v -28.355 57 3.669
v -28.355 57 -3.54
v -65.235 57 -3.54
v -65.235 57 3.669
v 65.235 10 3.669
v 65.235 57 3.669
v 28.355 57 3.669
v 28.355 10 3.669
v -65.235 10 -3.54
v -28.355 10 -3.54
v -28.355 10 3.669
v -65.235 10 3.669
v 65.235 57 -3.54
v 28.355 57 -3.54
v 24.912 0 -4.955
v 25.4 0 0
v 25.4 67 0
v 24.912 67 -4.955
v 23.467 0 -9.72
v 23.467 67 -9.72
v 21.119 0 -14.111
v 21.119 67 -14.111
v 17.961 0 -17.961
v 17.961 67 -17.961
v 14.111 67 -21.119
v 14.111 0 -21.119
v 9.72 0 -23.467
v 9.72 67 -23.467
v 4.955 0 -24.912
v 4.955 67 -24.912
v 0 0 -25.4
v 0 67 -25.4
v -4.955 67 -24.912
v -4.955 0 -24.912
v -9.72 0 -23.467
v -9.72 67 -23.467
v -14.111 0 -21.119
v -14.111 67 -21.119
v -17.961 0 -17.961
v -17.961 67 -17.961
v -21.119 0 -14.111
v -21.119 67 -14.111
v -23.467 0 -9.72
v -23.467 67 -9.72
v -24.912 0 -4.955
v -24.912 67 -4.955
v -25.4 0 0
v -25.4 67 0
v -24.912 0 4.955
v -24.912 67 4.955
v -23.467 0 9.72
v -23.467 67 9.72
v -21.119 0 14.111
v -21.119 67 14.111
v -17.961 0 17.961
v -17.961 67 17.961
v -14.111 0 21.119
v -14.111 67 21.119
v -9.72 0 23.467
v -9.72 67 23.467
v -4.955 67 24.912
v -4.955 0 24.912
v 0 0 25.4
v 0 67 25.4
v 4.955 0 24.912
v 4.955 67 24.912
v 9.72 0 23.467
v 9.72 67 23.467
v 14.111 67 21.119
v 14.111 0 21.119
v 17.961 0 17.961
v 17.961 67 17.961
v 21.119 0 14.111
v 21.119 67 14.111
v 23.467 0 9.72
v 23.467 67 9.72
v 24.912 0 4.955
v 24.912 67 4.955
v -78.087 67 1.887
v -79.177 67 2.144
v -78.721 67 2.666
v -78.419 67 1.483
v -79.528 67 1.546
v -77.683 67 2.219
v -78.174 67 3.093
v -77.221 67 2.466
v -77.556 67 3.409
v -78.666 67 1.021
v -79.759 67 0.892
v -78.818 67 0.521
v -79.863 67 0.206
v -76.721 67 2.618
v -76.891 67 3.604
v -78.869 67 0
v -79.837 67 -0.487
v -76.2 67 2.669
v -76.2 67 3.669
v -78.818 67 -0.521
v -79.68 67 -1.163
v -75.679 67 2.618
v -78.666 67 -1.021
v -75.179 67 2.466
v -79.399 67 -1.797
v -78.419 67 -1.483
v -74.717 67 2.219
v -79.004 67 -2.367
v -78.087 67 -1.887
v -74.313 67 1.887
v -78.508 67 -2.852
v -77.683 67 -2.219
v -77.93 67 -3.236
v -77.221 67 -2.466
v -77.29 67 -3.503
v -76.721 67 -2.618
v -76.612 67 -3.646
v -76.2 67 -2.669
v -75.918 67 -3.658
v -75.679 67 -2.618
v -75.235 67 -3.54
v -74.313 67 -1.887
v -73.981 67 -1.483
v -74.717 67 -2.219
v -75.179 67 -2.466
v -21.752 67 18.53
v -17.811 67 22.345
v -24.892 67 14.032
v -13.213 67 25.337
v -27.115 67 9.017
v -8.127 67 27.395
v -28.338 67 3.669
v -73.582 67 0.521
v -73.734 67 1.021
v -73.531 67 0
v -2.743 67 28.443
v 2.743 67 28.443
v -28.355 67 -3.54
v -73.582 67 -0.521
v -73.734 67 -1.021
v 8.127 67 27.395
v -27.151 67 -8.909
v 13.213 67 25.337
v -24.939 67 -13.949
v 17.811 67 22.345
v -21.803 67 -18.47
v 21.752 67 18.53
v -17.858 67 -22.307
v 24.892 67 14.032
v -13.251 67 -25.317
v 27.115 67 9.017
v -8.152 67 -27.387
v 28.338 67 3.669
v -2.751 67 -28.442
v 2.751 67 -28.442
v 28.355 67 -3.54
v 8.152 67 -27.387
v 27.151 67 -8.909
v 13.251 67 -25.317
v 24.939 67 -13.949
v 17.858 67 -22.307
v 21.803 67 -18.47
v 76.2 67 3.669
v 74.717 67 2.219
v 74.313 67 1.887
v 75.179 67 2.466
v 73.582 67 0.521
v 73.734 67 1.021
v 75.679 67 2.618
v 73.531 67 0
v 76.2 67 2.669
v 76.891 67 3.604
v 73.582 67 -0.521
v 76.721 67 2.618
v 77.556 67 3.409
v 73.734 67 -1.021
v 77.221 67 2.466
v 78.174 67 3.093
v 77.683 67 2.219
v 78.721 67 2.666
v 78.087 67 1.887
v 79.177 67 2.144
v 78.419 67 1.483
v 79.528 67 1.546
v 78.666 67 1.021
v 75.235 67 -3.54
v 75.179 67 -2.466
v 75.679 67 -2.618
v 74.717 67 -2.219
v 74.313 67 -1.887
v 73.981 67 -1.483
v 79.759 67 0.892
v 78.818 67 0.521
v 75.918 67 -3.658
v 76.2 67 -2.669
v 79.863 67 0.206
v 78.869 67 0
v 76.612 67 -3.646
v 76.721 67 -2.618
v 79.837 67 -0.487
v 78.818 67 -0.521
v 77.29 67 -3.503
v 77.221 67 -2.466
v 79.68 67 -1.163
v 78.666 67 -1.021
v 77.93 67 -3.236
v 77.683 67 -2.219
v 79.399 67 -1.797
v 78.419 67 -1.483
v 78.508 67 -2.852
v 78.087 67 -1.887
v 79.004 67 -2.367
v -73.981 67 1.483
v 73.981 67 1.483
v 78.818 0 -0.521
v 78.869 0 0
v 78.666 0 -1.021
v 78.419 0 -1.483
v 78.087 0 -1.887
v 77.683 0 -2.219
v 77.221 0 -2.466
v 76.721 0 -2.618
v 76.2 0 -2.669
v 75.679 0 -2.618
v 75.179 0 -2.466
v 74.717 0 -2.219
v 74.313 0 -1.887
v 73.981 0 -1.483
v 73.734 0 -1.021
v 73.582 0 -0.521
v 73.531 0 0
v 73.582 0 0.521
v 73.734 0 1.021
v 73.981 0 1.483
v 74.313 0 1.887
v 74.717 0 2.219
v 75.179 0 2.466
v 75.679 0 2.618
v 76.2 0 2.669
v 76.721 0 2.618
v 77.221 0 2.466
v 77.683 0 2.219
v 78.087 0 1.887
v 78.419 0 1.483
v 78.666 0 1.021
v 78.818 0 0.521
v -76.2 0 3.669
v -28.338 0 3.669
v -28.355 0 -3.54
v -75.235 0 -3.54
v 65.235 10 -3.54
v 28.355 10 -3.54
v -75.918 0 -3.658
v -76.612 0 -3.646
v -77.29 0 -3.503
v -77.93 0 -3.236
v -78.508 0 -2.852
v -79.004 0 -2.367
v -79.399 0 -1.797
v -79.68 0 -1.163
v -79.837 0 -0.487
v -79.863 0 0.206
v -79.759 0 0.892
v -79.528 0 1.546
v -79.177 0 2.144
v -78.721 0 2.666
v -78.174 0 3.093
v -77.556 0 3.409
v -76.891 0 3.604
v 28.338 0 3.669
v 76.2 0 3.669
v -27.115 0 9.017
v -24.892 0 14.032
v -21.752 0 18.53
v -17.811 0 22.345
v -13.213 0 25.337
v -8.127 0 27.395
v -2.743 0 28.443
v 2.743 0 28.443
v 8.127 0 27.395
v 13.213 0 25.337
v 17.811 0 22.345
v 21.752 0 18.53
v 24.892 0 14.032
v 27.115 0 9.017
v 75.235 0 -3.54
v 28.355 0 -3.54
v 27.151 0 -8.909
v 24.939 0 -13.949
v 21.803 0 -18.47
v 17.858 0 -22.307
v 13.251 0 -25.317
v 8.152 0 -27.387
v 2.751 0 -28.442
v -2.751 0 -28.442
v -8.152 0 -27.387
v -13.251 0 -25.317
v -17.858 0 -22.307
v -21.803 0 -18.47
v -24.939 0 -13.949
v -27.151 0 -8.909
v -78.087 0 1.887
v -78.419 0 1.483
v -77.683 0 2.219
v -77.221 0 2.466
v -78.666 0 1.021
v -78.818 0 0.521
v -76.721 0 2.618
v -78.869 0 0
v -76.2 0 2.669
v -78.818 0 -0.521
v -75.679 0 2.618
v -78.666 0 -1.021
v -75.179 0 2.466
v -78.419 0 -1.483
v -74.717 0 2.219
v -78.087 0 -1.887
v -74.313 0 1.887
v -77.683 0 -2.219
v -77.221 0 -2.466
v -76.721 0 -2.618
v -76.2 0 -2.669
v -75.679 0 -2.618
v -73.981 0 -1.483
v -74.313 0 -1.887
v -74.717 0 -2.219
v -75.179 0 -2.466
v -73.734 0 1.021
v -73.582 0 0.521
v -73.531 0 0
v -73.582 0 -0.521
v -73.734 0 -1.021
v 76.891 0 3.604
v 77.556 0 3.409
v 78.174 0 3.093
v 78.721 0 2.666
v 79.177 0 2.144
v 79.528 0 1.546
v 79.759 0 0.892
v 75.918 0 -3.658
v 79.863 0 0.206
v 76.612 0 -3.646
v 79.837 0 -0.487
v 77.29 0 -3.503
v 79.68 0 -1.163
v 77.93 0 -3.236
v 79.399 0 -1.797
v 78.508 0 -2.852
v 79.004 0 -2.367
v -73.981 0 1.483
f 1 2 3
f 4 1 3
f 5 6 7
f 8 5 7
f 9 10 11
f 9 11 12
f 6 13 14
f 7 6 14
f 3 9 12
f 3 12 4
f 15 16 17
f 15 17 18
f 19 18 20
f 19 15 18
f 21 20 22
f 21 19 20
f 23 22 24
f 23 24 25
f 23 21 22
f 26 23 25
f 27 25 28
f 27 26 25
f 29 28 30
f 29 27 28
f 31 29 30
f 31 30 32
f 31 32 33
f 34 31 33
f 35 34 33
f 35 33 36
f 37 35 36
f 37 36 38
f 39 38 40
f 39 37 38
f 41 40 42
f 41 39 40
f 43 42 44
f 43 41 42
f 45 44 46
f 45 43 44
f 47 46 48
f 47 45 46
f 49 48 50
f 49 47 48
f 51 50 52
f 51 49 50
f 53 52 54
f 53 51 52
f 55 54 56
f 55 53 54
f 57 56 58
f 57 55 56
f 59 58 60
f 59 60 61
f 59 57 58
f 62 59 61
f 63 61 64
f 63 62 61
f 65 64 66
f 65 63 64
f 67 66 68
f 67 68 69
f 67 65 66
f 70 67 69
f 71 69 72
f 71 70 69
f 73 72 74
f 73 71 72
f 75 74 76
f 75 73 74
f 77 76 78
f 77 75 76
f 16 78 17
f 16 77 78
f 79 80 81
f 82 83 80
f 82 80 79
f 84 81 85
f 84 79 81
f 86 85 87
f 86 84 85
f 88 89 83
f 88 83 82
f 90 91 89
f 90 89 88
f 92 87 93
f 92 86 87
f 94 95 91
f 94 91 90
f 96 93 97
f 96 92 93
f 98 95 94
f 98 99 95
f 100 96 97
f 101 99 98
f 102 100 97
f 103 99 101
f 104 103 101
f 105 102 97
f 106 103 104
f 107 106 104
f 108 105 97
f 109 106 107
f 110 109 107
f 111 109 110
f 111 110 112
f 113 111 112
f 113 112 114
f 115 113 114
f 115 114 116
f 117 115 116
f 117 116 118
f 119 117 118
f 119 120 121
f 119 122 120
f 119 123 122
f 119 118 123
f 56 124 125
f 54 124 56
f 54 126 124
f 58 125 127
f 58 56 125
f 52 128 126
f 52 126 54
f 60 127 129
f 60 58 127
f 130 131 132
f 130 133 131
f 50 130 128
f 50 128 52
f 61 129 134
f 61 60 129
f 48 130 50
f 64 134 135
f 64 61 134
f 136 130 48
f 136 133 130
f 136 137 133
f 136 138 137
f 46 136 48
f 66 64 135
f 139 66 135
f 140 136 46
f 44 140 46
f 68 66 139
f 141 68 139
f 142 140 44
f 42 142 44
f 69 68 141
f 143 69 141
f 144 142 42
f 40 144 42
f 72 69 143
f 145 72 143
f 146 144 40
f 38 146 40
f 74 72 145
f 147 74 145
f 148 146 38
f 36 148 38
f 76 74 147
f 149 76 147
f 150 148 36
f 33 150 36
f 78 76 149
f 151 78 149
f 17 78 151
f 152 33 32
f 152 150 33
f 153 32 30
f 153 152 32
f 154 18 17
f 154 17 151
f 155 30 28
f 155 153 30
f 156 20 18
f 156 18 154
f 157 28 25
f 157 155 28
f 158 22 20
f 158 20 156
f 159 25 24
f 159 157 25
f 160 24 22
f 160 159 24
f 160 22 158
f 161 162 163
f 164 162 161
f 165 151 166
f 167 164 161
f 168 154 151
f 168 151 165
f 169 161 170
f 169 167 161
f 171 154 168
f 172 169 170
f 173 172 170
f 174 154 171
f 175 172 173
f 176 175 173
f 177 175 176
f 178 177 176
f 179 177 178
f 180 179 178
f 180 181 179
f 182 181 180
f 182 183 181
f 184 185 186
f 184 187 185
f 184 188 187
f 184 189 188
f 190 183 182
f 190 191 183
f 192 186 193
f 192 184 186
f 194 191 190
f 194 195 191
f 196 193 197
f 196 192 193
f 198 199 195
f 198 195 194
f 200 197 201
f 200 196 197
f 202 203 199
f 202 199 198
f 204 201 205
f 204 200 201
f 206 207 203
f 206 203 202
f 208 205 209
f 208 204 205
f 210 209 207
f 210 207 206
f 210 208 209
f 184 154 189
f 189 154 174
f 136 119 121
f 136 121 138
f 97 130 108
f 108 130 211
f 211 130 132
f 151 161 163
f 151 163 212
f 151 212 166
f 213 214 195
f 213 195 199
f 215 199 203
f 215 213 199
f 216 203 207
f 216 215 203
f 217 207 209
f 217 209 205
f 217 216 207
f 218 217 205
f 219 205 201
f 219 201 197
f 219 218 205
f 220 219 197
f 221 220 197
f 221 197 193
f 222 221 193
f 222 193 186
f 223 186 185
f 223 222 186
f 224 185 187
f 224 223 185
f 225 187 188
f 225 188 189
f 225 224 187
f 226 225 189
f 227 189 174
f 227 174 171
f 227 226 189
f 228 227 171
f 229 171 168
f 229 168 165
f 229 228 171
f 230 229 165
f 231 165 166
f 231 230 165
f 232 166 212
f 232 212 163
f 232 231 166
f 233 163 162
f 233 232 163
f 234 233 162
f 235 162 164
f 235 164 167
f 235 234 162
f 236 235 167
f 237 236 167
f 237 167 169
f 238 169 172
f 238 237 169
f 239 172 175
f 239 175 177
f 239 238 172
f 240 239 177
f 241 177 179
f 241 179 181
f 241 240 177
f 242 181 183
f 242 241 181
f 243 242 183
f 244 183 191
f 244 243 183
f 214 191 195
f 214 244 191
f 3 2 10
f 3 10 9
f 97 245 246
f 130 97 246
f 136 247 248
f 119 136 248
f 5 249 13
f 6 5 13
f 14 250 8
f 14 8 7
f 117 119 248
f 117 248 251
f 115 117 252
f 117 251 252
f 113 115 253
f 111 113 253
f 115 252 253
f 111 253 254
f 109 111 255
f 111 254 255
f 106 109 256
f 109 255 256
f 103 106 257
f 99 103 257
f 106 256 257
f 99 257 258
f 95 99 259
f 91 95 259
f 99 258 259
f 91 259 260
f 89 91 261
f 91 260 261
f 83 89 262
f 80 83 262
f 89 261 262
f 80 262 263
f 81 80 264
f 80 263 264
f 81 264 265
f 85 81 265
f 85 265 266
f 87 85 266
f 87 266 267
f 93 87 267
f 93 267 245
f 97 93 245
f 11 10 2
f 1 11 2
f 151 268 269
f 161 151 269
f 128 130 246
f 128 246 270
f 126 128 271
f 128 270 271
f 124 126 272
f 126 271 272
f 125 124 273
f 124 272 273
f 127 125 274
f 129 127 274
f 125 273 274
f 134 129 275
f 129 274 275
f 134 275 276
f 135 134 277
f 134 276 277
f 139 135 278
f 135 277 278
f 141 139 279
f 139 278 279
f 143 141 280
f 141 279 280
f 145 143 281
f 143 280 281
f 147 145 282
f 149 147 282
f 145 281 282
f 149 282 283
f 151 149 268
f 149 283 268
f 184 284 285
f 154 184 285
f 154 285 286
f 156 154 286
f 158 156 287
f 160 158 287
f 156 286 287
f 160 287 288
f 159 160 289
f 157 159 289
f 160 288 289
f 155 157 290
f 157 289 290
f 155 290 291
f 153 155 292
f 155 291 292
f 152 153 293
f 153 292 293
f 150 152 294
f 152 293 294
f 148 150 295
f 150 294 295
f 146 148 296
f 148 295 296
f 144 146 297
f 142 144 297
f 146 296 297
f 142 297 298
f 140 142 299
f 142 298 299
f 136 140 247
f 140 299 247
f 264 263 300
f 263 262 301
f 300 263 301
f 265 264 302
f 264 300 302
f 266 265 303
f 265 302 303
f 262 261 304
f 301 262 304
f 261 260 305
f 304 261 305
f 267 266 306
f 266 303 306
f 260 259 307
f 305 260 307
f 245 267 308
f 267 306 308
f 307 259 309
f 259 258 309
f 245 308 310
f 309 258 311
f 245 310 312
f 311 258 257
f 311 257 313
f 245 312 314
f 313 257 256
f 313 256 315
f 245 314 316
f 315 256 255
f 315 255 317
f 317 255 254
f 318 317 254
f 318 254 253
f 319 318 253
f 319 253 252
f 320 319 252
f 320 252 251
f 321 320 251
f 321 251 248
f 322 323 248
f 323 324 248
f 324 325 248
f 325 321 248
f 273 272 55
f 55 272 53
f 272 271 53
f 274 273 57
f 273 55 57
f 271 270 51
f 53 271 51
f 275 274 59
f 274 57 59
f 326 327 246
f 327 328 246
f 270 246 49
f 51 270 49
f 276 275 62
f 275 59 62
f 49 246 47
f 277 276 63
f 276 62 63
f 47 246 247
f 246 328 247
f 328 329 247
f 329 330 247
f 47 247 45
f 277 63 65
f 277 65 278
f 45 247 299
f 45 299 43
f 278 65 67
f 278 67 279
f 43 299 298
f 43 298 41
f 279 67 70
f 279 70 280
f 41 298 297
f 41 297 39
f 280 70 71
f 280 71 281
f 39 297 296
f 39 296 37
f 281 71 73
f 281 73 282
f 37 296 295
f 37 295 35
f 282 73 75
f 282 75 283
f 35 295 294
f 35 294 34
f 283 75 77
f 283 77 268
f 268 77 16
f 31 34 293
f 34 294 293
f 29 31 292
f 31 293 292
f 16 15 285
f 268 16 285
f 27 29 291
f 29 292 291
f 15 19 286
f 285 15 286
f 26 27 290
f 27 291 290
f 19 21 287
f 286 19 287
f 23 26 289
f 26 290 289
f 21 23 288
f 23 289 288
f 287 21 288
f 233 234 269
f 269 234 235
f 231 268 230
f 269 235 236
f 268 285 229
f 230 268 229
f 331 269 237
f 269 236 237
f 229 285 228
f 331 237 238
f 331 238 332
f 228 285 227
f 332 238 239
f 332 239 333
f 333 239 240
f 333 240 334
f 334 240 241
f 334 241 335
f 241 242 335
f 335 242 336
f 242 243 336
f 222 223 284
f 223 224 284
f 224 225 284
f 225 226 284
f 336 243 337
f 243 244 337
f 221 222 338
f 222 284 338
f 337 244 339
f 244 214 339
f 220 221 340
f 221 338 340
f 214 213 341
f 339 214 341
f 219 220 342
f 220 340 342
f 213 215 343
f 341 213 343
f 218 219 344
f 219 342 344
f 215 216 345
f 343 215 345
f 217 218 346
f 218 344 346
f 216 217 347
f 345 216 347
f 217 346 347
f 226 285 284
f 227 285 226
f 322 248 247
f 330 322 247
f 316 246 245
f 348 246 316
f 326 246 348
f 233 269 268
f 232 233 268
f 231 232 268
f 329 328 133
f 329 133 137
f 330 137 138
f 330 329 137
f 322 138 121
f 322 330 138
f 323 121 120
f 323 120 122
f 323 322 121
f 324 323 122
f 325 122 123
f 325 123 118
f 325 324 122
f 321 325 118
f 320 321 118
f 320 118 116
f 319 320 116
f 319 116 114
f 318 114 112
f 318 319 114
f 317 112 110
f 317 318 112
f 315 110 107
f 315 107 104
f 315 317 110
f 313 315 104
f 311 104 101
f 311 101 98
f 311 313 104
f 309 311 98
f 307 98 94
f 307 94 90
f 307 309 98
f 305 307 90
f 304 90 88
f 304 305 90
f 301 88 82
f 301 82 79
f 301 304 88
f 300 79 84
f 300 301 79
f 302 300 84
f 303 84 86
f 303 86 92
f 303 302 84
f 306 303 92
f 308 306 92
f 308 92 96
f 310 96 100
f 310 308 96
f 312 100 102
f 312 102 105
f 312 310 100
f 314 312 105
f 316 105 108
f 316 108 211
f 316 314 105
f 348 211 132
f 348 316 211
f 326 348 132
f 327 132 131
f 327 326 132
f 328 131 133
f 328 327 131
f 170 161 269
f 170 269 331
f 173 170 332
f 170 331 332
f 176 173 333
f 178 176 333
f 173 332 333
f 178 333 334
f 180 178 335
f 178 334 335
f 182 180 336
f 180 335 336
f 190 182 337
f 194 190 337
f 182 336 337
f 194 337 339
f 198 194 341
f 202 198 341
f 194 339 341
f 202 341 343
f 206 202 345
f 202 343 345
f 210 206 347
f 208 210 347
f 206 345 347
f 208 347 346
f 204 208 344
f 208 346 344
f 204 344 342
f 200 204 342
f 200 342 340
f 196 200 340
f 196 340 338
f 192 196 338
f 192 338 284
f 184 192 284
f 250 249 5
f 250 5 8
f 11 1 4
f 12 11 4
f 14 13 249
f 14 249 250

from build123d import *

# Parameters (mm, degrees)
SKETCH1_R           = 25.4
SKETCH1_R_2         = 2.669147435
BOSS_EXTRUDE1_DEPTH = 67
SKETCH4_W           = 36.879658646
SKETCH4_H           = 47
BOSS_EXTRUDE2_DEPTH = 7.209
SKETCH5_W           = 36.879658646
SKETCH5_H           = 47
BOSS_EXTRUDE3_DEPTH = 7.209


with BuildPart() as part:
    # Sketch1 → Boss-Extrude1 (new body)
    with BuildSketch(Plane(origin=(0, 0, 0), x_dir=(1, 0, 0), z_dir=(0, 1, 0))):
        with BuildLine():
            ThreePointArc((76.2, -3.669147435), (79.83668007, 0.487032823), (75.234553617, 3.539852565))
            Line((75.234553617, 3.539852565), (28.354894971, 3.539852565))
            ThreePointArc((28.354894971, 3.539852565), (0, 28.575), (-28.354894971, 3.539852565))
            Line((-28.354894971, 3.539852565), (-75.234553617, 3.539852565))
            ThreePointArc((-75.234553617, 3.539852565), (-79.83668007, 0.487032823), (-76.2, -3.669147435))
            Line((-76.2, -3.669147435), (-28.338454123, -3.669147435))
            ThreePointArc((-28.338454123, -3.669147435), (0, -28.575), (28.338454123, -3.669147435))
            Line((28.338454123, -3.669147435), (76.2, -3.669147435))
        make_face()
        Circle(SKETCH1_R, mode=Mode.SUBTRACT)
        with Locations((-76.2, 0)):
            Circle(SKETCH1_R_2, mode=Mode.SUBTRACT)
        with Locations((76.2, 0)):
            Circle(SKETCH1_R_2, mode=Mode.SUBTRACT)
    extrude(amount=BOSS_EXTRUDE1_DEPTH)


with BuildPart() as body_2:
    # Sketch4 → Boss-Extrude2 (new body)
    with BuildSketch(Plane(origin=(0, 0, -3.539852565), x_dir=(-1, 0, 0), z_dir=(0, 0, -1))):
        with Locations((46.794724294, 33.5)):
            Rectangle(SKETCH4_W, SKETCH4_H)
    extrude(amount=-BOSS_EXTRUDE2_DEPTH)


with BuildPart() as body_3:
    # Sketch5 → Boss-Extrude3 (new body)
    with BuildSketch(Plane(origin=(0, 0, -3.539852565), x_dir=(-1, 0, 0), z_dir=(0, 0, -1))):
        with Locations((-46.794724294, 33.5)):
            Rectangle(SKETCH5_W, SKETCH5_H)
    extrude(amount=-BOSS_EXTRUDE3_DEPTH)


solid = Compound([part.part, body_2.part, body_3.part])
